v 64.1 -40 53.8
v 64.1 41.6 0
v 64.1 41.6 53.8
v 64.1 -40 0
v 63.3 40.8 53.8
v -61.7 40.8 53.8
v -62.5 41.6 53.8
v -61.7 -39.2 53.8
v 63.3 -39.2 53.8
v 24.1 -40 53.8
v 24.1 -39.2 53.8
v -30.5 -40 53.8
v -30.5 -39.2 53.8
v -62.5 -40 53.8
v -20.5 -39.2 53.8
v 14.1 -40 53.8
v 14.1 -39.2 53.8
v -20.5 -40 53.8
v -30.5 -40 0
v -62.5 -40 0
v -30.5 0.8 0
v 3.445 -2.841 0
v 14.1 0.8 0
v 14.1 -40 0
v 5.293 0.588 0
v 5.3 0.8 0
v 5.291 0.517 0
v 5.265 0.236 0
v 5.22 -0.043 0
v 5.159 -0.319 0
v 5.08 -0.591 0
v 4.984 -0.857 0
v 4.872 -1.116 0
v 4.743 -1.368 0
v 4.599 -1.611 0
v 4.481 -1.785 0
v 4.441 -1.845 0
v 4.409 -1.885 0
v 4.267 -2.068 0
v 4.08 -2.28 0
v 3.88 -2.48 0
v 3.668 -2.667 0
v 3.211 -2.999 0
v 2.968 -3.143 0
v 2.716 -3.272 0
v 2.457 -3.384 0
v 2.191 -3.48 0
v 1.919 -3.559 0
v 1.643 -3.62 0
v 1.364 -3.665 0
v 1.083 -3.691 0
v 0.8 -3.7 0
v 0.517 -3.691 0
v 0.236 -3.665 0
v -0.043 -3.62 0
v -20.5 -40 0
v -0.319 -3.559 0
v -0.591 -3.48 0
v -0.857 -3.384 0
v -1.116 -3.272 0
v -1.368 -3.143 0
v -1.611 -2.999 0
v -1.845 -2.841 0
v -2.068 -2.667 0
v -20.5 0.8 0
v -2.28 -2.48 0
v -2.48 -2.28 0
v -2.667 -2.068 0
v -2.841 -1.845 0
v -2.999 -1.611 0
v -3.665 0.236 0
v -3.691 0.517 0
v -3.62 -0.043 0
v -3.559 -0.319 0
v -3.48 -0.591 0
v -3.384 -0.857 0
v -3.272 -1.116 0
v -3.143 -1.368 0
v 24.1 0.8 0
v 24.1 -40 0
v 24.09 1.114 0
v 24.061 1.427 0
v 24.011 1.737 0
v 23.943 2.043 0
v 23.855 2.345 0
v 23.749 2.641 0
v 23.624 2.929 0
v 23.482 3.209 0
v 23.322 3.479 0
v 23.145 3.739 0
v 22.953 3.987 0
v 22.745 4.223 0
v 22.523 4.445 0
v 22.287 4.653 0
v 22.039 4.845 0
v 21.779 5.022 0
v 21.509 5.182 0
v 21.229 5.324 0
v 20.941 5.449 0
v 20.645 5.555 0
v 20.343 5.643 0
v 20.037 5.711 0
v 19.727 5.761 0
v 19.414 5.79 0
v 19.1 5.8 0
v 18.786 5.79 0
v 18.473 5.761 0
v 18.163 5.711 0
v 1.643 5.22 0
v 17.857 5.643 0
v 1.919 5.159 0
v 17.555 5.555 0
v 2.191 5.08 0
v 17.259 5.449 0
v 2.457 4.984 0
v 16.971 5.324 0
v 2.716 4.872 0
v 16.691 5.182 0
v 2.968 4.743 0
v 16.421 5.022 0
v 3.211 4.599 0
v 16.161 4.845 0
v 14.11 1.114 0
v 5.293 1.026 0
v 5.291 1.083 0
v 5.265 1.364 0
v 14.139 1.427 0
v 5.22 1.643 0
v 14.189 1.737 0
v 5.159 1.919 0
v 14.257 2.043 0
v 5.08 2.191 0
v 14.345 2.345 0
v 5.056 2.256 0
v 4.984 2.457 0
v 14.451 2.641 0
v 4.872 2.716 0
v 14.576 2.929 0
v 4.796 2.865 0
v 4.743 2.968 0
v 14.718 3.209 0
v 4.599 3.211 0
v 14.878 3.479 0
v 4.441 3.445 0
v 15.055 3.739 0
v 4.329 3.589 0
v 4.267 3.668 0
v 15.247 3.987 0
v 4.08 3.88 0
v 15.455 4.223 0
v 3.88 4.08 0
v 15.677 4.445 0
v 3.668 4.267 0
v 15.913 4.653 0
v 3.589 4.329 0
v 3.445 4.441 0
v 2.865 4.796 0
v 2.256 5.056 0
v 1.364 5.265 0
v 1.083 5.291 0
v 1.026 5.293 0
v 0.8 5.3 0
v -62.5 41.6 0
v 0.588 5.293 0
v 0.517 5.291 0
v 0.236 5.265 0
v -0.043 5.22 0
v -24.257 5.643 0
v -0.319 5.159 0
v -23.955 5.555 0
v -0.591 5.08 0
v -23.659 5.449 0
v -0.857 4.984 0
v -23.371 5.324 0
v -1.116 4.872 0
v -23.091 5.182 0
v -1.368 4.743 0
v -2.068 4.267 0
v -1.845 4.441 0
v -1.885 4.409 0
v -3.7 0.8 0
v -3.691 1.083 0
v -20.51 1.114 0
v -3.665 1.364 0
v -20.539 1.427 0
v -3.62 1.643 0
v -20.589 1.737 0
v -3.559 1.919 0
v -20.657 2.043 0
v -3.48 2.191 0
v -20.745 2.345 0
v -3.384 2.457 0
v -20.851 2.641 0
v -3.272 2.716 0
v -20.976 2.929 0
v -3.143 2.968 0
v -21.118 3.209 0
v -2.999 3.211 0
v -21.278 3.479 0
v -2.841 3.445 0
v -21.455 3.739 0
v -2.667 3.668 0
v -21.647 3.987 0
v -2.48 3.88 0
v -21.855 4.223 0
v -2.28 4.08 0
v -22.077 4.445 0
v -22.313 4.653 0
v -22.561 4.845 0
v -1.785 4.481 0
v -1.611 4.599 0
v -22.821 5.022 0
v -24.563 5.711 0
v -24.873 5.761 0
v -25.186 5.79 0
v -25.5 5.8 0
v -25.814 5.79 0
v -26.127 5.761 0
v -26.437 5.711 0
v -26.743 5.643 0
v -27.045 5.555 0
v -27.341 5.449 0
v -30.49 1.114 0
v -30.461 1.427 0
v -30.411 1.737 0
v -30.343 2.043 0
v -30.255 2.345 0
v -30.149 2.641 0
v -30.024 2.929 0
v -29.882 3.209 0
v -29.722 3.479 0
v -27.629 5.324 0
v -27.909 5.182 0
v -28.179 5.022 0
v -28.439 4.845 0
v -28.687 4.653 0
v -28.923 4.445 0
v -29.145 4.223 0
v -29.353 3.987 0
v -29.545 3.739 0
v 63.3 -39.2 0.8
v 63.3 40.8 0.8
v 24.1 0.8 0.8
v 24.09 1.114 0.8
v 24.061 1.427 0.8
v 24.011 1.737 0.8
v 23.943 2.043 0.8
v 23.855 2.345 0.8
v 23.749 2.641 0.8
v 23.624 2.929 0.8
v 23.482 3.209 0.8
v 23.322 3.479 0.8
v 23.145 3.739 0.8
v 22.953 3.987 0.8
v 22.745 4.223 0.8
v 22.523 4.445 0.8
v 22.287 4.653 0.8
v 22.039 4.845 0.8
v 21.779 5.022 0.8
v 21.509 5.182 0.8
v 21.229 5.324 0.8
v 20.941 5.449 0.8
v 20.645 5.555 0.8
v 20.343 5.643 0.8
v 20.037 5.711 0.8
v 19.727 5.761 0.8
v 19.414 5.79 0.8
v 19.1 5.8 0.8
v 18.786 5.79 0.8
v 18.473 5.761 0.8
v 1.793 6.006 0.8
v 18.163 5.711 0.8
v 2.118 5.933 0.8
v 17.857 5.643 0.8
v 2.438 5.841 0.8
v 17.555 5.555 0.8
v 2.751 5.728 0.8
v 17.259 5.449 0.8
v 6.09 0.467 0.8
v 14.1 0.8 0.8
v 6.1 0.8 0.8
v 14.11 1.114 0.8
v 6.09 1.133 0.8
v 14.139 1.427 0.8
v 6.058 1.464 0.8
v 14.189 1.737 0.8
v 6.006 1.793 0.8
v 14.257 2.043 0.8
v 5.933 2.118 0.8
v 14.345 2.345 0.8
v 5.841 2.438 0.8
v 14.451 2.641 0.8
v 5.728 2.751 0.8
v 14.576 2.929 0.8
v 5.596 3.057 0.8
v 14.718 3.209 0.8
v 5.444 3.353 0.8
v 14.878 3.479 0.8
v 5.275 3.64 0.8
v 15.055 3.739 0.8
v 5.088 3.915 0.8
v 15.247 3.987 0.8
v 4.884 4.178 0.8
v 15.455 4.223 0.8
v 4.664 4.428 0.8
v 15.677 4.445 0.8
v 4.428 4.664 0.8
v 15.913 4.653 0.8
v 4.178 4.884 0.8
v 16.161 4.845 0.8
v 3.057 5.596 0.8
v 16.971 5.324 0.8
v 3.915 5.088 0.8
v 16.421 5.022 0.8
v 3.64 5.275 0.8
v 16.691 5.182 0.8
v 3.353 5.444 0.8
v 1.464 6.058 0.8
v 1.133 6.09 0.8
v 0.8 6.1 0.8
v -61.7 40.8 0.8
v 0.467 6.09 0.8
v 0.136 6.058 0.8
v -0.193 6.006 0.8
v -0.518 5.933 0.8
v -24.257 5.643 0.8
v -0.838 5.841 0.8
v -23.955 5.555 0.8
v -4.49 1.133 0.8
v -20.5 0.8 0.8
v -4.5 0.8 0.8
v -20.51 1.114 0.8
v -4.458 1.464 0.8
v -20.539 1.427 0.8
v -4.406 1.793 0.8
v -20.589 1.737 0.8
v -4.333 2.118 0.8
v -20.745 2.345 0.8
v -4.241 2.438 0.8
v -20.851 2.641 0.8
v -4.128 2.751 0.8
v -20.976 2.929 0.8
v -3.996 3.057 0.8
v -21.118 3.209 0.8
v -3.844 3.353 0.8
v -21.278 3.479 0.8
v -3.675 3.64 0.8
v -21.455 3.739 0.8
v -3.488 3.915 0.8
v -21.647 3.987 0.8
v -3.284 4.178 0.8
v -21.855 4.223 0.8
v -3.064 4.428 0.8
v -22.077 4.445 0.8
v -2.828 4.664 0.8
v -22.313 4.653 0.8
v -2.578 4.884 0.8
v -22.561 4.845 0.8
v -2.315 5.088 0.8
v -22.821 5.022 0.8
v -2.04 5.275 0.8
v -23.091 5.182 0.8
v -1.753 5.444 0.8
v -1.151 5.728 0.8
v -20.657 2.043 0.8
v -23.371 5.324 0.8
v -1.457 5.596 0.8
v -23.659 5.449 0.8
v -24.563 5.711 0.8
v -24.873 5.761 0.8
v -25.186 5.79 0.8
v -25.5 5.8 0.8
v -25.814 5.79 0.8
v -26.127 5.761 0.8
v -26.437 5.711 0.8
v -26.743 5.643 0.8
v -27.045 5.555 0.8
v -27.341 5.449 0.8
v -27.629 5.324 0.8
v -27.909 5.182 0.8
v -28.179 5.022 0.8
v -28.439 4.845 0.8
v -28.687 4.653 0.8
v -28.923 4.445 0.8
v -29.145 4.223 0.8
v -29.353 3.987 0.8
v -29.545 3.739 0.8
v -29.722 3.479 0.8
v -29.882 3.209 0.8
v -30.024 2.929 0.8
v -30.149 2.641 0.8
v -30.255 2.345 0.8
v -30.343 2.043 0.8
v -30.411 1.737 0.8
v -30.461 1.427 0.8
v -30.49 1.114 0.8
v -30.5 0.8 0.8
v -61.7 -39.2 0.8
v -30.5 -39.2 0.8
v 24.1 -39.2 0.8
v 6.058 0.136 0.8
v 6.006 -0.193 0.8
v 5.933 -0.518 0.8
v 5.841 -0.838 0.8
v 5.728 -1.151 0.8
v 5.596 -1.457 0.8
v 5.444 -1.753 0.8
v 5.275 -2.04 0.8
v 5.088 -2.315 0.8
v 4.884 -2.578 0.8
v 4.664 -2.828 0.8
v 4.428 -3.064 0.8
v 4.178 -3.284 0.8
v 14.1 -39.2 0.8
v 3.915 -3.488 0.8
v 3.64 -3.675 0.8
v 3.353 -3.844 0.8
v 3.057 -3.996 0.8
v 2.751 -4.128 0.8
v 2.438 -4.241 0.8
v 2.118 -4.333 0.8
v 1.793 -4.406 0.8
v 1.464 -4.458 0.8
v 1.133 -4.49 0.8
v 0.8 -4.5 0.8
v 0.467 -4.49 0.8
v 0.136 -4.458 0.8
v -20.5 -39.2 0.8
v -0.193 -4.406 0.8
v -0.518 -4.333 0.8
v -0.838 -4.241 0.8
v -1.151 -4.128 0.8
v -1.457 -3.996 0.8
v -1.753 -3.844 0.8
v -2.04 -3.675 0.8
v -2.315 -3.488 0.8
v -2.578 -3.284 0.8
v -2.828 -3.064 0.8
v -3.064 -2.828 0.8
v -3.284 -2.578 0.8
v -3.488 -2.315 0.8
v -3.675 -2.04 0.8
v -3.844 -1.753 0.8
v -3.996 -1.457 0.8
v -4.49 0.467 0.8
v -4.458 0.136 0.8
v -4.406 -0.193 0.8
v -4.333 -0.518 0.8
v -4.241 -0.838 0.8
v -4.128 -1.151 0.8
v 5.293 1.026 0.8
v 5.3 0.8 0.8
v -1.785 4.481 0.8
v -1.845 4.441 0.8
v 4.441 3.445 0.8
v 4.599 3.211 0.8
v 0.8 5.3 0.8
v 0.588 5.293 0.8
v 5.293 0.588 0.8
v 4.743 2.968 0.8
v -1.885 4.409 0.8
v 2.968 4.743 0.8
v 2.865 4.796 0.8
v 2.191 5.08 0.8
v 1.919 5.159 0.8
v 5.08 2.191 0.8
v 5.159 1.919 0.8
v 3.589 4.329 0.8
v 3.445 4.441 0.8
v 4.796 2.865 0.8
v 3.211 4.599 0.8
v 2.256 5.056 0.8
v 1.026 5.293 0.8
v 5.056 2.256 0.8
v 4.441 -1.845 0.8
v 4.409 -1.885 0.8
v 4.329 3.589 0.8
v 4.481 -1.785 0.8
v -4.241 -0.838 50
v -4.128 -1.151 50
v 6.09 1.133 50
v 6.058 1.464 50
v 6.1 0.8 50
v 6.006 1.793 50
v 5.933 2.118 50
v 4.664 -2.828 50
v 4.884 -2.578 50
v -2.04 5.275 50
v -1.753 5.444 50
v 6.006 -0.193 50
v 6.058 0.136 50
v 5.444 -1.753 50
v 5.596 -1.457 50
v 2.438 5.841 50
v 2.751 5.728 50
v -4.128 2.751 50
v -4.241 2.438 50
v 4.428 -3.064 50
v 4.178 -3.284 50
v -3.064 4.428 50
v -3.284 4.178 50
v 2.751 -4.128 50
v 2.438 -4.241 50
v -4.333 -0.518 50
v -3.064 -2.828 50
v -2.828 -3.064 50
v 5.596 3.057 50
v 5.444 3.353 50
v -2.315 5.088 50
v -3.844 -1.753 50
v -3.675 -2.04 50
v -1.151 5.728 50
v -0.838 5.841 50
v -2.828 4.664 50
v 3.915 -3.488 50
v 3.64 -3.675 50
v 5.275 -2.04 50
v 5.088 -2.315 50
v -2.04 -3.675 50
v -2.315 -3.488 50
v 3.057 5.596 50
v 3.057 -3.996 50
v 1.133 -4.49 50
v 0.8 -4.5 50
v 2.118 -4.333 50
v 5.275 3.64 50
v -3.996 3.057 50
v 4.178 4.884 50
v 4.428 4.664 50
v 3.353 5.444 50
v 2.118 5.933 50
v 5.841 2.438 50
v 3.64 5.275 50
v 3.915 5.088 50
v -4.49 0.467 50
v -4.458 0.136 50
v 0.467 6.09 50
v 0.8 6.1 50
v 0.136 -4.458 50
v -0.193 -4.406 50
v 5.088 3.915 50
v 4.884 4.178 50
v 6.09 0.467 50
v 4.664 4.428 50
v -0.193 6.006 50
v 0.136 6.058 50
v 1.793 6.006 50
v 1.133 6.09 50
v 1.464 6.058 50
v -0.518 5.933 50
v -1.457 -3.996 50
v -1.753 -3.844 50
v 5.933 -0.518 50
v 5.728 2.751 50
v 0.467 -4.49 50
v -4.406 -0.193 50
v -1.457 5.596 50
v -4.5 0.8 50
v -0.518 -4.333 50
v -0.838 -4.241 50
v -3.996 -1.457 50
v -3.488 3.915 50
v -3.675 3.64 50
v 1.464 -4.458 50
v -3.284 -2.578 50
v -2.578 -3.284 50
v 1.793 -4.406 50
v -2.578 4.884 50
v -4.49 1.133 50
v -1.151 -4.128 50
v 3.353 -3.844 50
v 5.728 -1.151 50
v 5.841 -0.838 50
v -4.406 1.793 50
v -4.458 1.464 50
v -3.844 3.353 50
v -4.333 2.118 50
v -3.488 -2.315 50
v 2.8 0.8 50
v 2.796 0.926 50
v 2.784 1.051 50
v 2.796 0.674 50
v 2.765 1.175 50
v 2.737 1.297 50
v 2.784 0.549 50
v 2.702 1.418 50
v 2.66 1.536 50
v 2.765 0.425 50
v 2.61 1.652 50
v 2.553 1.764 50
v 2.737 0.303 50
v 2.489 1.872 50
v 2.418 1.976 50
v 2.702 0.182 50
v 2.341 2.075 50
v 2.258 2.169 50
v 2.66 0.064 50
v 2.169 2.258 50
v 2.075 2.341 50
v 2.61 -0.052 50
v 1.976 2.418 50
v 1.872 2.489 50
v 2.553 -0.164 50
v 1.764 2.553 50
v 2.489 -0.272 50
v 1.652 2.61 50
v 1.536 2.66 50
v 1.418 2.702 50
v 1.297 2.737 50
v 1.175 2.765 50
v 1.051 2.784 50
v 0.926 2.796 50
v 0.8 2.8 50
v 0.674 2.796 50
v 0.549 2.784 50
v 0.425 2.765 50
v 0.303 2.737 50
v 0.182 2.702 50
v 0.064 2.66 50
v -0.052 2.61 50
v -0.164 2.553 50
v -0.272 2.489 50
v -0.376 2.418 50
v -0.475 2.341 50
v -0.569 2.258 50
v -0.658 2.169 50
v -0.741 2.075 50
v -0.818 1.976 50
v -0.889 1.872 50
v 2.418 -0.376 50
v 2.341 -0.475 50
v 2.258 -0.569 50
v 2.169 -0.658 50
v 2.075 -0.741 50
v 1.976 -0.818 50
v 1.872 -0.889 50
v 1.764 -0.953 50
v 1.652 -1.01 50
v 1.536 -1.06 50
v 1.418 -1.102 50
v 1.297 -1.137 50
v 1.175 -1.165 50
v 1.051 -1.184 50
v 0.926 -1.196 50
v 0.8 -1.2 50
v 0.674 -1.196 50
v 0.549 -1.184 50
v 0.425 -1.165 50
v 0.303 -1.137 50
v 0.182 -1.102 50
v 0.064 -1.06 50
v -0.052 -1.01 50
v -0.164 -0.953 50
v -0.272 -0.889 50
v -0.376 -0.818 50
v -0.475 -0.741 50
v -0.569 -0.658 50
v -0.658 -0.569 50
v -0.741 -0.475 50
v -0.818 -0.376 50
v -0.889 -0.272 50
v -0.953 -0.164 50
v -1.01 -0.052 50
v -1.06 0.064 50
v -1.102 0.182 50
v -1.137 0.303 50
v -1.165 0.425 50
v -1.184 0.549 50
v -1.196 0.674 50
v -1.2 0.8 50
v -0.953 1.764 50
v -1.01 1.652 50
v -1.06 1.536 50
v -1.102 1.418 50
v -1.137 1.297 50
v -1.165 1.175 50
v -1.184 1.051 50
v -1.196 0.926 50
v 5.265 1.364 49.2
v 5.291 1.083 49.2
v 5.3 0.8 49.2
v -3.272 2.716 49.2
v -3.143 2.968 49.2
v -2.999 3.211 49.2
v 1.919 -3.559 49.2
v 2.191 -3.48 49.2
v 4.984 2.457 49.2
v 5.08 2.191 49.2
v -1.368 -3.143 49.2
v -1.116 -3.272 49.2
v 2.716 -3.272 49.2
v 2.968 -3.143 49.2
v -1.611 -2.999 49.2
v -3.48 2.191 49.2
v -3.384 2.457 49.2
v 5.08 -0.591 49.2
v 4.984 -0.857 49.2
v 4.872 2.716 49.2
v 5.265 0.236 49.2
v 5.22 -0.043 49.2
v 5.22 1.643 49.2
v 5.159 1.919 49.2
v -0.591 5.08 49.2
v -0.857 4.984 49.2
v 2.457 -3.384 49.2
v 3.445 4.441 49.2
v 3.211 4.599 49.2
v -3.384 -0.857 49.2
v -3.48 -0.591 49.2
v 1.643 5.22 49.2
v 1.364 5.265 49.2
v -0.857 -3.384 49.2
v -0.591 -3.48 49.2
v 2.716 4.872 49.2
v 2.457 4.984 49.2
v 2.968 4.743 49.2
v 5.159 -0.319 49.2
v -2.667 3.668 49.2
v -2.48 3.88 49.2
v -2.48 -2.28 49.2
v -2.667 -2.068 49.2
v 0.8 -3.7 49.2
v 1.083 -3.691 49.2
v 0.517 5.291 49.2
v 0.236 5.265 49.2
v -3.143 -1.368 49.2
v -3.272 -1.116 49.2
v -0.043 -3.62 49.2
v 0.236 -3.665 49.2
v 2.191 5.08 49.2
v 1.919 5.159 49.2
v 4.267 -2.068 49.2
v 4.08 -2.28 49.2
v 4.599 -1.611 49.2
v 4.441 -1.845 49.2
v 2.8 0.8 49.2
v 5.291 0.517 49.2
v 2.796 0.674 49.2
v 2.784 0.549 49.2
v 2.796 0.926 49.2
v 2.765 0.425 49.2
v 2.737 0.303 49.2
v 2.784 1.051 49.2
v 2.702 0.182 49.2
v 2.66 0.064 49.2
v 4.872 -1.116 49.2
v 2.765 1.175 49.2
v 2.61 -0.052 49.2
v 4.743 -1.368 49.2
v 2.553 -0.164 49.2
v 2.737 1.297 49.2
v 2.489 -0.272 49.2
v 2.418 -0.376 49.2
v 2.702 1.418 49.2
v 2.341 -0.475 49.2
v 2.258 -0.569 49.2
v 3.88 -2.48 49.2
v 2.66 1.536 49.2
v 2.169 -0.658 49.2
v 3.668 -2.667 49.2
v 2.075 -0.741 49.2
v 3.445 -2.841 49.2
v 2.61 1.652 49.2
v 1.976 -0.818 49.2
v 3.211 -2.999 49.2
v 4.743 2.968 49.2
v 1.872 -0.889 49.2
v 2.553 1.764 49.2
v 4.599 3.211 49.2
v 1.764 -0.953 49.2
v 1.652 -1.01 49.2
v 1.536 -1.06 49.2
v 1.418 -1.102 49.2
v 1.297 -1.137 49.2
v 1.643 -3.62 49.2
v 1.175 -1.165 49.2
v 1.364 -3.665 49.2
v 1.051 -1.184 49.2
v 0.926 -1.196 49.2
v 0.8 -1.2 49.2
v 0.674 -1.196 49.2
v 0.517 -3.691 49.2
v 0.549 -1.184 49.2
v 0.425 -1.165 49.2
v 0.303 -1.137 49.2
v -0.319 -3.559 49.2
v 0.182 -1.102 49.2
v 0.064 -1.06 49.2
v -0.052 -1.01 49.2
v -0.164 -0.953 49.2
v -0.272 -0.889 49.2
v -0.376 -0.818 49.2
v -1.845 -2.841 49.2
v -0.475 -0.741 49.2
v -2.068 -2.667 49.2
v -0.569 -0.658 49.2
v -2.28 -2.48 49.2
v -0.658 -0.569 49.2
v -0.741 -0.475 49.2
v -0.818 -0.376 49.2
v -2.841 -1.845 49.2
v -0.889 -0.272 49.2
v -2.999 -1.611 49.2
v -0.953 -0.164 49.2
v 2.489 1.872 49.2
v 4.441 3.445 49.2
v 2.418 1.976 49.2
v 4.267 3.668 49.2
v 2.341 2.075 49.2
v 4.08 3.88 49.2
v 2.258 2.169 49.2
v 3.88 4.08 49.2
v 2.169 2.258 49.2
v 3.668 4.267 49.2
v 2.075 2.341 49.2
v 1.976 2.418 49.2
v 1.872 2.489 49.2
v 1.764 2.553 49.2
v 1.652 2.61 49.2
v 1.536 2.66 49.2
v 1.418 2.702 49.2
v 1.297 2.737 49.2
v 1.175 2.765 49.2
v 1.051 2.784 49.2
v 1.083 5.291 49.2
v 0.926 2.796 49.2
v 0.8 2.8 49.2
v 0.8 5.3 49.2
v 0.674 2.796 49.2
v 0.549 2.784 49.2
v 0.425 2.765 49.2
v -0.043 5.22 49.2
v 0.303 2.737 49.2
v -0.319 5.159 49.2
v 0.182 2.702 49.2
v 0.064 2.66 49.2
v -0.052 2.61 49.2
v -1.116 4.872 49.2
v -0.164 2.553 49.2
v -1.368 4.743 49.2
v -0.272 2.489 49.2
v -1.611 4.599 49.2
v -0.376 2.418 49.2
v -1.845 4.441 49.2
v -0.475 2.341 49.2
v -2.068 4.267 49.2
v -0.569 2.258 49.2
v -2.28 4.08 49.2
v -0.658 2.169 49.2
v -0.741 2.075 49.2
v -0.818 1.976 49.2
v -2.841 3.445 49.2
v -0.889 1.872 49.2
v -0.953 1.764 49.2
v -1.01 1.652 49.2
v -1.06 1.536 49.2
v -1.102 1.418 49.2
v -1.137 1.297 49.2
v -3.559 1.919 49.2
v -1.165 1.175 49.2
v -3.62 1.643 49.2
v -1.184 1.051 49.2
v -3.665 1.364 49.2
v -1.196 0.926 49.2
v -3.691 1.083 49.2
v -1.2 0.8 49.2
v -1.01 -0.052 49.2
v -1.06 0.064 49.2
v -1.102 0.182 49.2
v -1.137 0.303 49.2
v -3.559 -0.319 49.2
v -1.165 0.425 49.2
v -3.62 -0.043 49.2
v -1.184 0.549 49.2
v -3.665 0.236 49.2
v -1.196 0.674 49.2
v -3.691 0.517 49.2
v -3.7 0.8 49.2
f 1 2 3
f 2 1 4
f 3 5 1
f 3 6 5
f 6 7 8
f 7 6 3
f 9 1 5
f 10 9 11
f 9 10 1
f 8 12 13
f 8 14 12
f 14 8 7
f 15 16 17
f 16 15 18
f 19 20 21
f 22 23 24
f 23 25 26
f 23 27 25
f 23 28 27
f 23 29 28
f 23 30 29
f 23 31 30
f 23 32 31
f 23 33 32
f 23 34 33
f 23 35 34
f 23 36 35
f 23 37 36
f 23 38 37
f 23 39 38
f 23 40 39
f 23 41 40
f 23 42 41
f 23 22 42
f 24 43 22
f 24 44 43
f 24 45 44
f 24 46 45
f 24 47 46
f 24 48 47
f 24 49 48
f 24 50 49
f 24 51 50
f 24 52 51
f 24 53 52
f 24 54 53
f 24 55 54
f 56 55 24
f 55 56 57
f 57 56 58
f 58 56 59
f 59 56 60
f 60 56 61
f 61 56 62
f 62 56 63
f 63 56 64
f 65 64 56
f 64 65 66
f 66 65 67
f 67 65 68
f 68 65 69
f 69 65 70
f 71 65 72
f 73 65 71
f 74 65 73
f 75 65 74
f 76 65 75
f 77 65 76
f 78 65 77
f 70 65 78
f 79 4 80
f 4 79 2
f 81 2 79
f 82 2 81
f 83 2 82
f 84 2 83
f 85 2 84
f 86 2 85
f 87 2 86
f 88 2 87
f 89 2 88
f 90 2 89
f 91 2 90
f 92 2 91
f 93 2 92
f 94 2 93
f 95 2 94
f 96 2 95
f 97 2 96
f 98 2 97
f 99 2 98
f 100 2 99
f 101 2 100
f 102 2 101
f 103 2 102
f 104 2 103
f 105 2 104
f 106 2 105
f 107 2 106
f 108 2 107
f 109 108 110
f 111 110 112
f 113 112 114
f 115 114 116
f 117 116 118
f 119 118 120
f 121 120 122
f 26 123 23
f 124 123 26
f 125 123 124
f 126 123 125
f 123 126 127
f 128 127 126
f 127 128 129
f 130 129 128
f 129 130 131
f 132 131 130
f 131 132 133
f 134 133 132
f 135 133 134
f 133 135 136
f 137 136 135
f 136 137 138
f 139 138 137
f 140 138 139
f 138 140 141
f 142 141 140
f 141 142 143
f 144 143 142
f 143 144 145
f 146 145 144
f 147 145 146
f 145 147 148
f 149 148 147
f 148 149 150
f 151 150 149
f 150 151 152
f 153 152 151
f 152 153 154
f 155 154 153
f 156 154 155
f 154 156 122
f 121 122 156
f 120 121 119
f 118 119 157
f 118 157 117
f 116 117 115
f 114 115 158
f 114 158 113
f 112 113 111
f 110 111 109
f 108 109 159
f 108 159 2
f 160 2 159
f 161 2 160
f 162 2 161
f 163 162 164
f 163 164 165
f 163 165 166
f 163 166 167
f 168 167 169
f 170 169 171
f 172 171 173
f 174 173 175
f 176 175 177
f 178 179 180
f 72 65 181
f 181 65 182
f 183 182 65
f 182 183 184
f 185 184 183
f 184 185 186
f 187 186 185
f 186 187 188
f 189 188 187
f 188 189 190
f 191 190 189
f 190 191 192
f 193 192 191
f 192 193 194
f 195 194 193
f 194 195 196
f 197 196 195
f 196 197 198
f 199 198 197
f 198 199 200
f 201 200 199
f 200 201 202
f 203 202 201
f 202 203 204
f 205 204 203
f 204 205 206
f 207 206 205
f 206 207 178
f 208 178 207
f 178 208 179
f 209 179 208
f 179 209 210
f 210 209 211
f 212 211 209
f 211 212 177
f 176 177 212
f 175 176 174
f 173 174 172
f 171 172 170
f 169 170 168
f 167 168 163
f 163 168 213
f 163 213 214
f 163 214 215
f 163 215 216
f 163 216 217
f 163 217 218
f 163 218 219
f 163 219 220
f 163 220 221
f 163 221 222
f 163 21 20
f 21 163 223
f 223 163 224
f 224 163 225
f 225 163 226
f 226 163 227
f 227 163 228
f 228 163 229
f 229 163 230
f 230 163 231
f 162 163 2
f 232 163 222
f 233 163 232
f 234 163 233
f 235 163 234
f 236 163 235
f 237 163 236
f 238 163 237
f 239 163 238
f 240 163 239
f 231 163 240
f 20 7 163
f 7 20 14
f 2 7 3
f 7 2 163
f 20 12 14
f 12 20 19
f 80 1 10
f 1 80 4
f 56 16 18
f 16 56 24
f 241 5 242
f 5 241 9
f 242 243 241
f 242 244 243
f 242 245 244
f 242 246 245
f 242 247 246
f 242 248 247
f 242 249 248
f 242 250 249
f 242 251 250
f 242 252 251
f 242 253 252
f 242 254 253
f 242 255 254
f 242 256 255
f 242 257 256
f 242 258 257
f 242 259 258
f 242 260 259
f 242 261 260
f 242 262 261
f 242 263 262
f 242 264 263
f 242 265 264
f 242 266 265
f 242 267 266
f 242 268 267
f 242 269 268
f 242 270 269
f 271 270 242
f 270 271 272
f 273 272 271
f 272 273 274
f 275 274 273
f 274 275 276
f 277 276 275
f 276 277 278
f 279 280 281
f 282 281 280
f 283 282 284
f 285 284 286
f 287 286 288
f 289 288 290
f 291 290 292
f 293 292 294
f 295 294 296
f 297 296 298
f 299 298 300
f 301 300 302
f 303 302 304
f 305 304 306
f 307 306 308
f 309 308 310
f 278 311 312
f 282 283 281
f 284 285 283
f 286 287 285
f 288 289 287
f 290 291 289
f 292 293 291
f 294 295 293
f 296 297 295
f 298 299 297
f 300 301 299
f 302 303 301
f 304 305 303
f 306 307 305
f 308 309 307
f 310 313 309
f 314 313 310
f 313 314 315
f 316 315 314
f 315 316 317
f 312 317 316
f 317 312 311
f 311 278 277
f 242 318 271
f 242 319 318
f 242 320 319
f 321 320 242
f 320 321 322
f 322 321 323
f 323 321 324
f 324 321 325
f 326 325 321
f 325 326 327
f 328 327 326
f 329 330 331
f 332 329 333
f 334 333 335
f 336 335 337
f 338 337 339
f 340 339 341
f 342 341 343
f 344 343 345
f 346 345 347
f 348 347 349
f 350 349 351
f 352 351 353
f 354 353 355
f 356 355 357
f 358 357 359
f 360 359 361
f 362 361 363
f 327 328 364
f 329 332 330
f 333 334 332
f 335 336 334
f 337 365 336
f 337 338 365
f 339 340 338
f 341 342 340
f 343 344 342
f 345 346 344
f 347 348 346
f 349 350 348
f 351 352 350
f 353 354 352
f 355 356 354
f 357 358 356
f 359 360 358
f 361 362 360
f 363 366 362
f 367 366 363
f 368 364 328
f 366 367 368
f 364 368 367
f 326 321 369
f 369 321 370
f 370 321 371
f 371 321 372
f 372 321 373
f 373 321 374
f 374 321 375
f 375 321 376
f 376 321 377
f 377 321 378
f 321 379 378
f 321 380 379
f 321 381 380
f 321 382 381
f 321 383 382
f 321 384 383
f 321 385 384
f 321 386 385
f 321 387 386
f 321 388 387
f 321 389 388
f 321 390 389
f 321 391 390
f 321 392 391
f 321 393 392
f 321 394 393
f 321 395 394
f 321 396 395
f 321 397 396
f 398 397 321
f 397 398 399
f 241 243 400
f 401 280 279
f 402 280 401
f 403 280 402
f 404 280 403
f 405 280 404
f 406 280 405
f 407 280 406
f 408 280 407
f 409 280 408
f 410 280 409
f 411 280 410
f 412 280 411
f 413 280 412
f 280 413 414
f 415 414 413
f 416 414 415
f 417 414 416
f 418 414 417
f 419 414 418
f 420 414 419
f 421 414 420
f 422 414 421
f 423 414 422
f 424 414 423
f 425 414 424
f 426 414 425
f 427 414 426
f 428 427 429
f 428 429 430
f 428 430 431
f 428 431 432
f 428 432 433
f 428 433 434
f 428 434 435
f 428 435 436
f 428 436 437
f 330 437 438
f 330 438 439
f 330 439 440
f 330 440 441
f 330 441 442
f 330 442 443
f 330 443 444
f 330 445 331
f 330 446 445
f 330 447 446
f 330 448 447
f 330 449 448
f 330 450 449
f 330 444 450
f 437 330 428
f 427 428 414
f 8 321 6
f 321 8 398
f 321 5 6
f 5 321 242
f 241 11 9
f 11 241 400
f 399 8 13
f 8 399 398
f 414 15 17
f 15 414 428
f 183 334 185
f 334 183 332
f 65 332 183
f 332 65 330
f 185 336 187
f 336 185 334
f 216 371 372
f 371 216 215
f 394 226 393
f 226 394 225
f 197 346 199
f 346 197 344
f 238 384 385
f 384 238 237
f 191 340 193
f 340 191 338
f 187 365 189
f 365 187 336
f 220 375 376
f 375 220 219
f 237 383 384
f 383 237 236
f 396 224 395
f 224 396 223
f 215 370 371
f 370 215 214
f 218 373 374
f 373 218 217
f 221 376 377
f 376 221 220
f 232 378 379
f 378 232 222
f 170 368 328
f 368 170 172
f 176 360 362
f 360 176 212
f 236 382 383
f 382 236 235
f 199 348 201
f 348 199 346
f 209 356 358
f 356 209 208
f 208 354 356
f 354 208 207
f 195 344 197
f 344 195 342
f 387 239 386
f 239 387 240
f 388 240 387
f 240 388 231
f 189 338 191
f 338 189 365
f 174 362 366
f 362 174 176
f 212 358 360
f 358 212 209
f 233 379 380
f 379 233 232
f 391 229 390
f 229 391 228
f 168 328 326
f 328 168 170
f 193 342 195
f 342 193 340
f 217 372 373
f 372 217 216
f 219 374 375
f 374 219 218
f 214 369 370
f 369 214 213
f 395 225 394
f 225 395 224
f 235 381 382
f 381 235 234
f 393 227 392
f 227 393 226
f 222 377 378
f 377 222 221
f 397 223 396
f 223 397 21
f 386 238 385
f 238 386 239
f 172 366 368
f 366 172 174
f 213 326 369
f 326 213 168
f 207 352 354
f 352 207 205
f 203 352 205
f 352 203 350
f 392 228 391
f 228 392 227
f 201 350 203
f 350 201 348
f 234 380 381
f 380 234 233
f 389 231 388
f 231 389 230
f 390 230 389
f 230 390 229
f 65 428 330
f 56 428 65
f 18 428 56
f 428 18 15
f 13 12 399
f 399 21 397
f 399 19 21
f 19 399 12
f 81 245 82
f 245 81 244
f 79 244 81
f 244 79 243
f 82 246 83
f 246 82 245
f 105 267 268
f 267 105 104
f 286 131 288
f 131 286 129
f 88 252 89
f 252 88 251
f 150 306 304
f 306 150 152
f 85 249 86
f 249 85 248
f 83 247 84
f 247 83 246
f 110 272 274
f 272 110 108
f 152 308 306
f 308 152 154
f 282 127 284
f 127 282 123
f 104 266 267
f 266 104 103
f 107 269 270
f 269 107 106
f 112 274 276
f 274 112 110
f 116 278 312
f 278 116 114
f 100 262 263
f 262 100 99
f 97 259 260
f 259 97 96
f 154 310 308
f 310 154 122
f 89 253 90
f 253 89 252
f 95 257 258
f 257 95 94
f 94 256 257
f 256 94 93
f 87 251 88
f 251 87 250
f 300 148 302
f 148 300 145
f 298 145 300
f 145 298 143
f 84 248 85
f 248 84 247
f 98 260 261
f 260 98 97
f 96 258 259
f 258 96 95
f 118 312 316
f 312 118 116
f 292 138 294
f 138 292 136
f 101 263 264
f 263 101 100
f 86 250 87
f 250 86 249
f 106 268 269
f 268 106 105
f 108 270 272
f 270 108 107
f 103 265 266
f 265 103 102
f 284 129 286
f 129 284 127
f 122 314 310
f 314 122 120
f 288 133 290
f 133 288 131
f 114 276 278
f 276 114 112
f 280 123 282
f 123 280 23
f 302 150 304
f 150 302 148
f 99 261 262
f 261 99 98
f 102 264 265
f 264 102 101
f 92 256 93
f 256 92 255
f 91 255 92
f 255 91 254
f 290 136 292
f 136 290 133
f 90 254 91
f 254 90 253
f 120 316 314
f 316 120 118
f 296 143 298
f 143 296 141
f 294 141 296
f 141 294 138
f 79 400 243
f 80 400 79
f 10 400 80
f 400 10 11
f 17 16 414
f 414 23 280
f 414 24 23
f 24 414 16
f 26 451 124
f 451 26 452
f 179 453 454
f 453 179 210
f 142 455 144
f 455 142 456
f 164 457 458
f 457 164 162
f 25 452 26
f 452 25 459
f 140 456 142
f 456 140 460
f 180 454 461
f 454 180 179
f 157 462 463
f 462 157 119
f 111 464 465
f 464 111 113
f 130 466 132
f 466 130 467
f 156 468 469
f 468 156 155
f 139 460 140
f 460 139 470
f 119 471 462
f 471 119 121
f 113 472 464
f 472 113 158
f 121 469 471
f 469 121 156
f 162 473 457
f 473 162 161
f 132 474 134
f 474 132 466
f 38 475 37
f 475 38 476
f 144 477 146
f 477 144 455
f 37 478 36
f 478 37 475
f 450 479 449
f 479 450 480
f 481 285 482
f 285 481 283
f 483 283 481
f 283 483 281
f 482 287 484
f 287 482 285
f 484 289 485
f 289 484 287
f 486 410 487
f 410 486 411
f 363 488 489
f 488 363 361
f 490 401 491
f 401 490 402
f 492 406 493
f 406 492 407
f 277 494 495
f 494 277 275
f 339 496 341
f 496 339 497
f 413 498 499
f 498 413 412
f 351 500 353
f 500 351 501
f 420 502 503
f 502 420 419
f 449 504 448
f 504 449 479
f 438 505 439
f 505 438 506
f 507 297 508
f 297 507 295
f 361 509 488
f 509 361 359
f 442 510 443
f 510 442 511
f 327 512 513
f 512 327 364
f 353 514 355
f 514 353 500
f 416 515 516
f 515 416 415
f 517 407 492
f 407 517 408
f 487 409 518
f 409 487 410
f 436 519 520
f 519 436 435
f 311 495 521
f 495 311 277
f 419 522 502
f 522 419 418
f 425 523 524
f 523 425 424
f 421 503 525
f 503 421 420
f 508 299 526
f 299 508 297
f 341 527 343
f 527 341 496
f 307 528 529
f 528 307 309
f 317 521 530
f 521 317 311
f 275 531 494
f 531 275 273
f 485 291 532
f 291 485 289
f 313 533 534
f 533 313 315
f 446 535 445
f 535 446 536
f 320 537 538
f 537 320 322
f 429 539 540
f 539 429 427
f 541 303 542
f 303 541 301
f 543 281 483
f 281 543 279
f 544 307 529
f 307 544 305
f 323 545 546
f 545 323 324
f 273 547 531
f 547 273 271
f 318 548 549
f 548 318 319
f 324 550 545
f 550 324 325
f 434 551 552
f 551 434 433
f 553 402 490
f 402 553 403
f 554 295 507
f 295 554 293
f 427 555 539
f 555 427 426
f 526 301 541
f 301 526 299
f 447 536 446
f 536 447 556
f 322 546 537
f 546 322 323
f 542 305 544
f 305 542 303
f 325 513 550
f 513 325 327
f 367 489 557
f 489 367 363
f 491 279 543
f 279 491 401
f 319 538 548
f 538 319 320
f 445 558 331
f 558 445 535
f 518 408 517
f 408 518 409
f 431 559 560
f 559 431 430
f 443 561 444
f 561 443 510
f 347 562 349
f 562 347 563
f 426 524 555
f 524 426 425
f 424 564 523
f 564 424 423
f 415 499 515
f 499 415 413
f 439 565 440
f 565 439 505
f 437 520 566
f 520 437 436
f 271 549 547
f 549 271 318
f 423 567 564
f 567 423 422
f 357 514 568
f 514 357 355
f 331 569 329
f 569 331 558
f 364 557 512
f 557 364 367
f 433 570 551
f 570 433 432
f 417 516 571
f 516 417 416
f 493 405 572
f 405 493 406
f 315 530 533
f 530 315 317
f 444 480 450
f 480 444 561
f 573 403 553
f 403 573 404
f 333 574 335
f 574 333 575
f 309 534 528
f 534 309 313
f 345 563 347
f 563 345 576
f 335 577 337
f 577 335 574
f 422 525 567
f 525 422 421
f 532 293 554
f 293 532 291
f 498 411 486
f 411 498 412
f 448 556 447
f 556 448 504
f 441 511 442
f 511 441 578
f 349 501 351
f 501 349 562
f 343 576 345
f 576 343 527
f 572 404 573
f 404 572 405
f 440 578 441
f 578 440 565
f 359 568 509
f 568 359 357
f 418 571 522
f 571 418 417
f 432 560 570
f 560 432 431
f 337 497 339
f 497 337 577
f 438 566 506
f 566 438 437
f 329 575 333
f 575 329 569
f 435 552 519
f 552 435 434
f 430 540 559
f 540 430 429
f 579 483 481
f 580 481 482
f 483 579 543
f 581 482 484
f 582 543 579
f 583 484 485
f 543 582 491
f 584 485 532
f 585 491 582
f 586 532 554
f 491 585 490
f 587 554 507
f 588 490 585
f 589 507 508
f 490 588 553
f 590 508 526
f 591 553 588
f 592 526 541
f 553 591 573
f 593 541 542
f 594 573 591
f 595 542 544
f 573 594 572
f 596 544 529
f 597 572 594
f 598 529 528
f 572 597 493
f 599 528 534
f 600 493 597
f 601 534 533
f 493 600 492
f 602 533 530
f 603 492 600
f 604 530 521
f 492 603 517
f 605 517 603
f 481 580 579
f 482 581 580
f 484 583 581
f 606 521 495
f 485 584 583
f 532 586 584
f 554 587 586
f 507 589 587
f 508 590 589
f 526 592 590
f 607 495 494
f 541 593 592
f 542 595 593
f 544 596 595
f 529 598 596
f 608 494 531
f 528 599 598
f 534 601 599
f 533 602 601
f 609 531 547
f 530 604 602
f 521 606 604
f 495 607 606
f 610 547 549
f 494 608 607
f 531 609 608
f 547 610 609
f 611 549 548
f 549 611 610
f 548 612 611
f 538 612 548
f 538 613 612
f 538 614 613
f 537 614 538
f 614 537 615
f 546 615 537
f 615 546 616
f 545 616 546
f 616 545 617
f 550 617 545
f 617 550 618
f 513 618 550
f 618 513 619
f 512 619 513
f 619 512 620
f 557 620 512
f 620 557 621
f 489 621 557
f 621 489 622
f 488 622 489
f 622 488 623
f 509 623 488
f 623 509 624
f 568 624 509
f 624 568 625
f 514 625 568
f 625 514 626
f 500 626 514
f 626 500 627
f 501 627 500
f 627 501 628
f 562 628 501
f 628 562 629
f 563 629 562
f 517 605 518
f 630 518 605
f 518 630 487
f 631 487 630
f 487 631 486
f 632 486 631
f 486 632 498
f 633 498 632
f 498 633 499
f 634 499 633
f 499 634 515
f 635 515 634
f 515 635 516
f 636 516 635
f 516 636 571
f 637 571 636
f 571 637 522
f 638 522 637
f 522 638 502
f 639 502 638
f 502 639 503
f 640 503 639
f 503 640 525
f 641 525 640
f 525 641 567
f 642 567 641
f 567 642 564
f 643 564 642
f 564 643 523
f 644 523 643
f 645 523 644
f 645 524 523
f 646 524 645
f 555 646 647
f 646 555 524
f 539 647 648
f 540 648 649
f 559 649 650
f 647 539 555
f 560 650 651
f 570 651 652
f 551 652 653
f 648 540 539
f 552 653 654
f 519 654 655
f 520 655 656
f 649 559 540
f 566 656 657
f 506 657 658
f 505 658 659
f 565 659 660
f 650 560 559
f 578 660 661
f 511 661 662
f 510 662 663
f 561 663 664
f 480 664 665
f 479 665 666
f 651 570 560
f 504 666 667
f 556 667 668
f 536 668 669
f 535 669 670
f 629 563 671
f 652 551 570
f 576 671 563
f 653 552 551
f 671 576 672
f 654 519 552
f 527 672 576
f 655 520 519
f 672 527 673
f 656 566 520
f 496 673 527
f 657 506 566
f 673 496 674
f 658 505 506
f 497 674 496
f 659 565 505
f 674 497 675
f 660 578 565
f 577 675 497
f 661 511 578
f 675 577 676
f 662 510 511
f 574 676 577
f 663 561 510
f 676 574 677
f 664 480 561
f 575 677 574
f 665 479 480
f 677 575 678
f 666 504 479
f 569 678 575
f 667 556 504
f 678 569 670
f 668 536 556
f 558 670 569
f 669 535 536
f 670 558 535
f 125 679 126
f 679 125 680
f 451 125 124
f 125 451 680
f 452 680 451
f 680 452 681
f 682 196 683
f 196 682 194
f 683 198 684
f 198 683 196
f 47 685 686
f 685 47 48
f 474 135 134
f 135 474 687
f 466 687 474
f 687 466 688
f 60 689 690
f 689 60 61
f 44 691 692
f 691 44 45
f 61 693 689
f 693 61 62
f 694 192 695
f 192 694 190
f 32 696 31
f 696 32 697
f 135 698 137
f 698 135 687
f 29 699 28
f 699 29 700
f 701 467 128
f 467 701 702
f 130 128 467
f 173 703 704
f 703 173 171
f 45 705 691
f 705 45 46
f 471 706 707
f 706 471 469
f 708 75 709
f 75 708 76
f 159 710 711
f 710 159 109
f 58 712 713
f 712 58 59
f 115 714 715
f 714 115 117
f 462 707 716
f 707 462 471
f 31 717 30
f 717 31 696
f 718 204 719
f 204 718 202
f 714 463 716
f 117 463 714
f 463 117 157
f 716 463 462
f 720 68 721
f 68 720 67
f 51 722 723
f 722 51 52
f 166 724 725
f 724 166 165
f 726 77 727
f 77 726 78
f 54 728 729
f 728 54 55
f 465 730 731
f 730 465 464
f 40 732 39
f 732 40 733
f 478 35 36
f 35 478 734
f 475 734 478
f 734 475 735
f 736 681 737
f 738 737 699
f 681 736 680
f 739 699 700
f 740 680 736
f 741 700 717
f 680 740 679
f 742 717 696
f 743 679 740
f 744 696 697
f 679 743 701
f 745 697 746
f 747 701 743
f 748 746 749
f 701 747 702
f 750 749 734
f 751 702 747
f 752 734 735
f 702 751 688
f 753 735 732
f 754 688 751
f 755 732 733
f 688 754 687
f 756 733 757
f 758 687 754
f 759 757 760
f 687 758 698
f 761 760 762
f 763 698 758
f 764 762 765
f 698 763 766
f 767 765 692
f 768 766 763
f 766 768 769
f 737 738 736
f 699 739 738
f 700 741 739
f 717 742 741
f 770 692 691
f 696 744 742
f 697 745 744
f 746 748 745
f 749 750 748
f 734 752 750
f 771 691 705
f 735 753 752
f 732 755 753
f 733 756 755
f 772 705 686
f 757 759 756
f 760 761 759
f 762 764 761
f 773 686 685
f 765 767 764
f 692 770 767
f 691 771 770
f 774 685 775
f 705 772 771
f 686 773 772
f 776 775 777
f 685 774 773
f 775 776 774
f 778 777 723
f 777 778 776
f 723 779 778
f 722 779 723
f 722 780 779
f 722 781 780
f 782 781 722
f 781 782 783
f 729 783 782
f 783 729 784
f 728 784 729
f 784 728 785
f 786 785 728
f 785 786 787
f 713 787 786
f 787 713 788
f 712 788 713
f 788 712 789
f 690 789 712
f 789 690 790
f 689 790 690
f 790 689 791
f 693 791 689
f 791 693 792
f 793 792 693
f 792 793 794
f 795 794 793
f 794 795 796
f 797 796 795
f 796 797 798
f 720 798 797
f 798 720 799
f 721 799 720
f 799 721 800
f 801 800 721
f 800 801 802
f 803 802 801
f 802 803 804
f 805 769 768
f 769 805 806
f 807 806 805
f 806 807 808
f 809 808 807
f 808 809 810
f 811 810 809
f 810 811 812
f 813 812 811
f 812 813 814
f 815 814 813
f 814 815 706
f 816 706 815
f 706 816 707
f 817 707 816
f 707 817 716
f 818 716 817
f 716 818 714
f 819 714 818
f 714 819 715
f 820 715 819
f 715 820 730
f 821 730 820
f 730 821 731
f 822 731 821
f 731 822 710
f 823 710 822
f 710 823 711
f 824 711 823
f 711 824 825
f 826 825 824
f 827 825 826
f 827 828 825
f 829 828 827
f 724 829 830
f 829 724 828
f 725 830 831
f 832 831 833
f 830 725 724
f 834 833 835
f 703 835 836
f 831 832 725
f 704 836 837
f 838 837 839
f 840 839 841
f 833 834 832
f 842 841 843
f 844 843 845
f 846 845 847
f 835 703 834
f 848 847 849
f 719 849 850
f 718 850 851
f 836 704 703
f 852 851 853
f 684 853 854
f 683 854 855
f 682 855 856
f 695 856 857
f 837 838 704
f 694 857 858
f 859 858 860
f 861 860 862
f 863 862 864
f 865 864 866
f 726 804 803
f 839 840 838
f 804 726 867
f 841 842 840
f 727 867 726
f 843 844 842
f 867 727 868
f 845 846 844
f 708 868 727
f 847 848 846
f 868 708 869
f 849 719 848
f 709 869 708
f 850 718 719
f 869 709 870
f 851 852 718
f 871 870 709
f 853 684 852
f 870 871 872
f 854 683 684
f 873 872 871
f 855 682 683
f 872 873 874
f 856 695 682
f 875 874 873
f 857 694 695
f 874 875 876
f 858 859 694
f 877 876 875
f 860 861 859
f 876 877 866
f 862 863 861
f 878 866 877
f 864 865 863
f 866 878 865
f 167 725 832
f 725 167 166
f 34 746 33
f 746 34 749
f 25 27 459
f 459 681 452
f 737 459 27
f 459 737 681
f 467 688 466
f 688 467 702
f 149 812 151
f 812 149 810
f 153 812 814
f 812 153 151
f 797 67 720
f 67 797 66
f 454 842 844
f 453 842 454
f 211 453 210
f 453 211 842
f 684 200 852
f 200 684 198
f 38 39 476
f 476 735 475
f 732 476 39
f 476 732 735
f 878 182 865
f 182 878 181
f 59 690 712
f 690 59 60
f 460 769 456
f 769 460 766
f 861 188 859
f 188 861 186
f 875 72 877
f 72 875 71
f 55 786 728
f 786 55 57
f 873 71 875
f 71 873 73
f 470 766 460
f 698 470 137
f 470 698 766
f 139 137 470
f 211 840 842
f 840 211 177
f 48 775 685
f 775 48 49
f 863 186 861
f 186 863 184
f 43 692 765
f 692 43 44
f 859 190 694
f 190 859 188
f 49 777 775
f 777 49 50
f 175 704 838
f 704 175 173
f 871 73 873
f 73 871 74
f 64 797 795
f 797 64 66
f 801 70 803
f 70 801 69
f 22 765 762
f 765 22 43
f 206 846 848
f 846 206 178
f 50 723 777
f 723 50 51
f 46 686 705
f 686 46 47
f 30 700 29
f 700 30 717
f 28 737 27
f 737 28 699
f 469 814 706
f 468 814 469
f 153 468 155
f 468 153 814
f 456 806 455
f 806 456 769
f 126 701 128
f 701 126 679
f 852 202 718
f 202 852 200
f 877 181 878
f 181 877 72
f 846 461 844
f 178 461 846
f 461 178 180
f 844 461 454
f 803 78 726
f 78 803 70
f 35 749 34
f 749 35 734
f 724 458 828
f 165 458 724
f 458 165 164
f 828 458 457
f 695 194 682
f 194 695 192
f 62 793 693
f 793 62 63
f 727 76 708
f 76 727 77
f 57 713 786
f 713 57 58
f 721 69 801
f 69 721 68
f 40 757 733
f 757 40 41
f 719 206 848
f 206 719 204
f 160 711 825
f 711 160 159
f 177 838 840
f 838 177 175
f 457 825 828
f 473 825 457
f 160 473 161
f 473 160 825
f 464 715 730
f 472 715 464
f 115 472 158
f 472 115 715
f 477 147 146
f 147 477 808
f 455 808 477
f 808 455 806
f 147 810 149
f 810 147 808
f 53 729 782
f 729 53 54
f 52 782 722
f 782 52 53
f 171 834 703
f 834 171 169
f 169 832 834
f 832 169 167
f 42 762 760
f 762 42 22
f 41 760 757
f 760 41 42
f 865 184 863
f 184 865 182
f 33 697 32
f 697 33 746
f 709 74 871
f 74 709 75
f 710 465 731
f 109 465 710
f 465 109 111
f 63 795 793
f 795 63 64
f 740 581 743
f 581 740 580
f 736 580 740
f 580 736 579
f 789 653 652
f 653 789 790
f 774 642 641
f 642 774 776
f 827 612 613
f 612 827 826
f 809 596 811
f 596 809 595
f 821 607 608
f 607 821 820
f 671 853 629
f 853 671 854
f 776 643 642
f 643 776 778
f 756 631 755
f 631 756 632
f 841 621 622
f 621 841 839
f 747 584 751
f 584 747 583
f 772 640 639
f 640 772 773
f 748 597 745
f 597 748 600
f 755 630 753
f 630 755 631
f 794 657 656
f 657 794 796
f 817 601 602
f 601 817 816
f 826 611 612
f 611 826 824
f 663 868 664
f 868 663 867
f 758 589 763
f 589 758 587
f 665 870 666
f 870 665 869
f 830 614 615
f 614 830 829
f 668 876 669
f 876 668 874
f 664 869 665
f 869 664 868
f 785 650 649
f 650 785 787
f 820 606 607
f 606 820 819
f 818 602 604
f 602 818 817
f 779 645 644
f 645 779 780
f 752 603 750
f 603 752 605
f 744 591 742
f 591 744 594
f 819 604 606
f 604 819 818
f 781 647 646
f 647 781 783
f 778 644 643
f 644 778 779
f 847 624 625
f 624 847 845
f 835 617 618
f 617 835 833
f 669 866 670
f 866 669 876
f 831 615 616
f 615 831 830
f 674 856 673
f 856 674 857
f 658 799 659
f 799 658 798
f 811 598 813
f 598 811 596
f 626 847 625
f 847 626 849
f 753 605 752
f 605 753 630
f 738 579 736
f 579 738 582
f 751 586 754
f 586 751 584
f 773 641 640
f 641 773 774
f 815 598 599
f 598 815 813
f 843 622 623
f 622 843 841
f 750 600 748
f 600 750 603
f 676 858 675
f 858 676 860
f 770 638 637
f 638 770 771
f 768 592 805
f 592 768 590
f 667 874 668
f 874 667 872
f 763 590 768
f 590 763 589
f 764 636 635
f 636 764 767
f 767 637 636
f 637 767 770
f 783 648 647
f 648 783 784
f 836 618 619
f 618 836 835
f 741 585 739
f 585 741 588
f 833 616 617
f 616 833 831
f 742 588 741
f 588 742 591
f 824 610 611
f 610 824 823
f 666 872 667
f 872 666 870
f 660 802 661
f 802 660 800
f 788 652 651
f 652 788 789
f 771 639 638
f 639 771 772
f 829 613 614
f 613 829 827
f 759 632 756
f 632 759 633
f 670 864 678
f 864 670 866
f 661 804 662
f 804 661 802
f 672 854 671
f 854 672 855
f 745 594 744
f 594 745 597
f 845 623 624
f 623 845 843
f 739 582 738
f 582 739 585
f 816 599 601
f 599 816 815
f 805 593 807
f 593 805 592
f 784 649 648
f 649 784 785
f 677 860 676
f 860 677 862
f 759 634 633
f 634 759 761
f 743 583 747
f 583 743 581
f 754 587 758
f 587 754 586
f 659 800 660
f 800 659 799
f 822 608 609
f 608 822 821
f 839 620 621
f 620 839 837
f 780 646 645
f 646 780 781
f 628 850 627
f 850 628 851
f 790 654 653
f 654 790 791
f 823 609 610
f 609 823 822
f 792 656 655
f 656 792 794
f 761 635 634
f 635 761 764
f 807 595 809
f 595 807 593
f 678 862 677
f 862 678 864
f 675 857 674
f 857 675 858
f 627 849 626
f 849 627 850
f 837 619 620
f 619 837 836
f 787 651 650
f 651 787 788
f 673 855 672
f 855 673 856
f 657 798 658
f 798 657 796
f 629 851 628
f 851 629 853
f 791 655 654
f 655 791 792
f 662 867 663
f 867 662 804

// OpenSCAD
$fn=100;

filament_t = 0.4;
wall_t = filament_t * 2;

box_l = 125;
box_w = 80;
box_h = 53;
box_lip = 3;

cord_d = 10;
cord_r = cord_d / 2;
cord_off1 = 45;
cord_off2 = 37;

screw_d = 4;
screw_r = screw_d / 2;
screw_head_d = 9;
screw_head_r = screw_head_d / 2;

module box() {
    difference() {
        cube([box_l + wall_t * 2, box_w + wall_t * 2, box_h + wall_t]);
        translate([wall_t, wall_t, wall_t])
        cube([box_l, box_w, box_h + wall_t]);
    }
}

module cord_cut() {
    translate([0, box_w / 2 + wall_t, -wall_t])
    cylinder(r=cord_r, h=wall_t * 3);
    translate([-cord_r, -wall_t, -wall_t])
    cube([cord_d, box_w / 2 + wall_t * 2, box_h + wall_t * 3]);
}

module screw_tube() {
    difference() {
        cylinder(r=screw_head_r + wall_t, h=box_h - box_lip);
        translate([0, 0, -wall_t])
        cylinder(r=screw_head_r, h=box_h - box_lip);
        translate([0, 0, -1])
        cylinder(r=screw_r, h=box_h + 2);
    }
}

translate([-box_l/2, -box_w / 2, 0]) {
difference() {
    box();
    translate([cord_off2, 0, 0])
    cord_cut();
    translate([box_l + wall_t * 2 - cord_off1, 0, 0])
    cord_cut();
    translate([box_l / 2 + wall_t, box_w / 2 + wall_t, -wall_t])
    cylinder(r=screw_head_r, h=wall_t * 3);
}
translate([box_l / 2 + wall_t, box_w / 2 + wall_t, 0])
    screw_tube();
}
